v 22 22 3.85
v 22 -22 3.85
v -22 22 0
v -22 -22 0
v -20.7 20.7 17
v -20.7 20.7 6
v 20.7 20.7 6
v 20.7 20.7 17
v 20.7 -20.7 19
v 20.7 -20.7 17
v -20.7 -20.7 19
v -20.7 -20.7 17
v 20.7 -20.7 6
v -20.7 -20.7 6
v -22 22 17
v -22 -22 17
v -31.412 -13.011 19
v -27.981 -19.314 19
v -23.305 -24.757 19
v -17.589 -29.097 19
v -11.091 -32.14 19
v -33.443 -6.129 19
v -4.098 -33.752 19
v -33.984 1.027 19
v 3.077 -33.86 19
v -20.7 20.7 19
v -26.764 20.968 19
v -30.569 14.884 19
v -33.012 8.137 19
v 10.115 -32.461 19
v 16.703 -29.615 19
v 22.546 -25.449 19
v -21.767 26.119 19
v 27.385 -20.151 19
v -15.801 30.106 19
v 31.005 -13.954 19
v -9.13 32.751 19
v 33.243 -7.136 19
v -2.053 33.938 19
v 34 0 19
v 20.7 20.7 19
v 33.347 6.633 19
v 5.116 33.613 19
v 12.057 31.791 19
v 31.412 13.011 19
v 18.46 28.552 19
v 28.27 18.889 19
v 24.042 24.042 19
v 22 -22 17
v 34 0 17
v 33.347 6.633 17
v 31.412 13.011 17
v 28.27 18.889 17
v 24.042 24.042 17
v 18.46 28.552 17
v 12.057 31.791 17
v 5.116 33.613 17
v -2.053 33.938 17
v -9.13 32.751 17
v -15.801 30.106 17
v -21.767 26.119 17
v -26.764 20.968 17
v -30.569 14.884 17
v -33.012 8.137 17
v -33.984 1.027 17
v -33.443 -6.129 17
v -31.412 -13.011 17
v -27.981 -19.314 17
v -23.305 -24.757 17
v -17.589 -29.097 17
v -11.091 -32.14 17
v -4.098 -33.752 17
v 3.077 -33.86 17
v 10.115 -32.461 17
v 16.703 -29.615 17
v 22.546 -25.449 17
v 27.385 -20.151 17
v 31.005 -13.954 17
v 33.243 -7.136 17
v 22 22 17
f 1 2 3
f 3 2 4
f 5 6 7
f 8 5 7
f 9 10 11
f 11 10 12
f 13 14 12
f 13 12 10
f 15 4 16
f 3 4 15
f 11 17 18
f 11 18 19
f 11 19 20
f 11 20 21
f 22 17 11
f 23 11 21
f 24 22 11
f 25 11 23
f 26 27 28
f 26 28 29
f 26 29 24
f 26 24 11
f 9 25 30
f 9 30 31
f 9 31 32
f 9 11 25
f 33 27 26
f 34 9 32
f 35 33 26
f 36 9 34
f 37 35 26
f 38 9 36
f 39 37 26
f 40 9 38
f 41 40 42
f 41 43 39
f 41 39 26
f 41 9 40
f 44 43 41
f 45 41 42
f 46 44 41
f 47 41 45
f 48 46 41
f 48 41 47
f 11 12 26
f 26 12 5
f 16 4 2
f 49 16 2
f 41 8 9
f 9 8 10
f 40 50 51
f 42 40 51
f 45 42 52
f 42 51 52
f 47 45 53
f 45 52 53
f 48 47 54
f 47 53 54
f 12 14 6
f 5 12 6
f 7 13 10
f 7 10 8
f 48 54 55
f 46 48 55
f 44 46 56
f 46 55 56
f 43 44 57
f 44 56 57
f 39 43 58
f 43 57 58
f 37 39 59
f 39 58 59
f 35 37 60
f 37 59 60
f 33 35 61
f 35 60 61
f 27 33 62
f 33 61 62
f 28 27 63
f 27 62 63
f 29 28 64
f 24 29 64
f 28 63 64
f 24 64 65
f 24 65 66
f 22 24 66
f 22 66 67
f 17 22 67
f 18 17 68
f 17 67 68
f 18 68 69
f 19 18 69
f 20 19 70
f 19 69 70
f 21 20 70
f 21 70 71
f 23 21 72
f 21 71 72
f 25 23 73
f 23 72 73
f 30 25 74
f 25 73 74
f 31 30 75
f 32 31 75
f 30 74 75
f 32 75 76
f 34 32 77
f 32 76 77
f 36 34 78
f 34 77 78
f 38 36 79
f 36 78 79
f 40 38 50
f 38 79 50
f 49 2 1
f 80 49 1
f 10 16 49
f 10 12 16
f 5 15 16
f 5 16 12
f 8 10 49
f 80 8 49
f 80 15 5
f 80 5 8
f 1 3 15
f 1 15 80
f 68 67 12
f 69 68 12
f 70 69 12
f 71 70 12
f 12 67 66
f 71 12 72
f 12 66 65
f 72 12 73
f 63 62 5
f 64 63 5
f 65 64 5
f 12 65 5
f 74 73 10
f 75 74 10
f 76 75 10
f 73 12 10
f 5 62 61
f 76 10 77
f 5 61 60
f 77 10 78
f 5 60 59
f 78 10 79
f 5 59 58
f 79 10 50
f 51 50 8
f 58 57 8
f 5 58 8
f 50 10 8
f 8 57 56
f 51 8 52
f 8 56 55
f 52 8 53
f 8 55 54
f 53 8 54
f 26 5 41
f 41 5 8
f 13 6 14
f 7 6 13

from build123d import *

# Parameters (mm, degrees)
F0_W     = 44
F0_H     = 44
F0_R     = 1.5
F1_DEPTH = 6
F2_W     = 44
F2_H     = 44
F2_W_2   = 41.4
F2_H_2   = 41.4
F3_DEPTH = 11
F4_W     = 44
F4_H     = 44
F5_DEPTH = 2
F7_DEPTH = 56.001


# Not quite as in the source:
# - the program builds the solid bodies; features that only make, move or delete a surface that nothing else refers to are left out


with BuildPart() as f1:
    # F0 (on Top) → F1 (new body)
    with BuildSketch(Plane.XY):
        Rectangle(F0_W, F0_H)
        with Locations((0, -17.25)):
            Circle(F0_R, mode=Mode.SUBTRACT)
        with Locations((-17.25, 0)):
            Circle(F0_R, mode=Mode.SUBTRACT)
        with Locations((17.25, 0)):
            Circle(F0_R, mode=Mode.SUBTRACT)
        with Locations((0, 17.25)):
            Circle(F0_R, mode=Mode.SUBTRACT)
        with Locations((0, -17.25)):
            Circle(F0_R)
        with Locations((-17.25, 0)):
            Circle(F0_R)
        with Locations((17.25, 0)):
            Circle(F0_R)
        with Locations((0, 17.25)):
            Circle(F0_R)
    extrude(amount=F1_DEPTH)

    # F2 (on face) → F3 (join)
    with BuildSketch(Plane.XY.offset(6)):
        Rectangle(F2_W, F2_H)
        Rectangle(F2_W_2, F2_H_2, mode=Mode.SUBTRACT)
    extrude(amount=F3_DEPTH)

    # F6 (on face) → F7 (cut, through all)
    with BuildSketch(Plane.XZ.offset(22)):
        Polygon((-22, 0), (22, 0), (22, 3.8495011951), align=None)
    extrude(amount=-F7_DEPTH, mode=Mode.SUBTRACT)


with BuildPart() as f5:
    # F4 (on face) → F5 (new body)
    with BuildSketch(Plane.XY.offset(17)):
        with BuildLine():
            ThreePointArc((34, 0), (31.4119041054, 13.0112367004), (24.0416305603, 24.0416305603))
            ThreePointArc((24.0416305603, 24.0416305603), (-31.4119041054, -13.0112367004), (34, 0))
        make_face()
        Rectangle(F4_W, F4_H, mode=Mode.SUBTRACT)
        Polygon((22, 22), (-22, 22), (-20.7, 20.7), (20.7, 20.7), align=None)
        Polygon((22, -22), (22, 22), (20.7, 20.7), (20.7, -20.7), align=None)
        Polygon((-20.7, 20.7), (-22, 22), (-22, -22), (-20.7, -20.7), align=None)
        Polygon((-20.7, -20.7), (-22, -22), (22, -22), (20.7, -20.7), align=None)
    extrude(amount=F5_DEPTH)


solid = Compound([f1.part, f5.part])
